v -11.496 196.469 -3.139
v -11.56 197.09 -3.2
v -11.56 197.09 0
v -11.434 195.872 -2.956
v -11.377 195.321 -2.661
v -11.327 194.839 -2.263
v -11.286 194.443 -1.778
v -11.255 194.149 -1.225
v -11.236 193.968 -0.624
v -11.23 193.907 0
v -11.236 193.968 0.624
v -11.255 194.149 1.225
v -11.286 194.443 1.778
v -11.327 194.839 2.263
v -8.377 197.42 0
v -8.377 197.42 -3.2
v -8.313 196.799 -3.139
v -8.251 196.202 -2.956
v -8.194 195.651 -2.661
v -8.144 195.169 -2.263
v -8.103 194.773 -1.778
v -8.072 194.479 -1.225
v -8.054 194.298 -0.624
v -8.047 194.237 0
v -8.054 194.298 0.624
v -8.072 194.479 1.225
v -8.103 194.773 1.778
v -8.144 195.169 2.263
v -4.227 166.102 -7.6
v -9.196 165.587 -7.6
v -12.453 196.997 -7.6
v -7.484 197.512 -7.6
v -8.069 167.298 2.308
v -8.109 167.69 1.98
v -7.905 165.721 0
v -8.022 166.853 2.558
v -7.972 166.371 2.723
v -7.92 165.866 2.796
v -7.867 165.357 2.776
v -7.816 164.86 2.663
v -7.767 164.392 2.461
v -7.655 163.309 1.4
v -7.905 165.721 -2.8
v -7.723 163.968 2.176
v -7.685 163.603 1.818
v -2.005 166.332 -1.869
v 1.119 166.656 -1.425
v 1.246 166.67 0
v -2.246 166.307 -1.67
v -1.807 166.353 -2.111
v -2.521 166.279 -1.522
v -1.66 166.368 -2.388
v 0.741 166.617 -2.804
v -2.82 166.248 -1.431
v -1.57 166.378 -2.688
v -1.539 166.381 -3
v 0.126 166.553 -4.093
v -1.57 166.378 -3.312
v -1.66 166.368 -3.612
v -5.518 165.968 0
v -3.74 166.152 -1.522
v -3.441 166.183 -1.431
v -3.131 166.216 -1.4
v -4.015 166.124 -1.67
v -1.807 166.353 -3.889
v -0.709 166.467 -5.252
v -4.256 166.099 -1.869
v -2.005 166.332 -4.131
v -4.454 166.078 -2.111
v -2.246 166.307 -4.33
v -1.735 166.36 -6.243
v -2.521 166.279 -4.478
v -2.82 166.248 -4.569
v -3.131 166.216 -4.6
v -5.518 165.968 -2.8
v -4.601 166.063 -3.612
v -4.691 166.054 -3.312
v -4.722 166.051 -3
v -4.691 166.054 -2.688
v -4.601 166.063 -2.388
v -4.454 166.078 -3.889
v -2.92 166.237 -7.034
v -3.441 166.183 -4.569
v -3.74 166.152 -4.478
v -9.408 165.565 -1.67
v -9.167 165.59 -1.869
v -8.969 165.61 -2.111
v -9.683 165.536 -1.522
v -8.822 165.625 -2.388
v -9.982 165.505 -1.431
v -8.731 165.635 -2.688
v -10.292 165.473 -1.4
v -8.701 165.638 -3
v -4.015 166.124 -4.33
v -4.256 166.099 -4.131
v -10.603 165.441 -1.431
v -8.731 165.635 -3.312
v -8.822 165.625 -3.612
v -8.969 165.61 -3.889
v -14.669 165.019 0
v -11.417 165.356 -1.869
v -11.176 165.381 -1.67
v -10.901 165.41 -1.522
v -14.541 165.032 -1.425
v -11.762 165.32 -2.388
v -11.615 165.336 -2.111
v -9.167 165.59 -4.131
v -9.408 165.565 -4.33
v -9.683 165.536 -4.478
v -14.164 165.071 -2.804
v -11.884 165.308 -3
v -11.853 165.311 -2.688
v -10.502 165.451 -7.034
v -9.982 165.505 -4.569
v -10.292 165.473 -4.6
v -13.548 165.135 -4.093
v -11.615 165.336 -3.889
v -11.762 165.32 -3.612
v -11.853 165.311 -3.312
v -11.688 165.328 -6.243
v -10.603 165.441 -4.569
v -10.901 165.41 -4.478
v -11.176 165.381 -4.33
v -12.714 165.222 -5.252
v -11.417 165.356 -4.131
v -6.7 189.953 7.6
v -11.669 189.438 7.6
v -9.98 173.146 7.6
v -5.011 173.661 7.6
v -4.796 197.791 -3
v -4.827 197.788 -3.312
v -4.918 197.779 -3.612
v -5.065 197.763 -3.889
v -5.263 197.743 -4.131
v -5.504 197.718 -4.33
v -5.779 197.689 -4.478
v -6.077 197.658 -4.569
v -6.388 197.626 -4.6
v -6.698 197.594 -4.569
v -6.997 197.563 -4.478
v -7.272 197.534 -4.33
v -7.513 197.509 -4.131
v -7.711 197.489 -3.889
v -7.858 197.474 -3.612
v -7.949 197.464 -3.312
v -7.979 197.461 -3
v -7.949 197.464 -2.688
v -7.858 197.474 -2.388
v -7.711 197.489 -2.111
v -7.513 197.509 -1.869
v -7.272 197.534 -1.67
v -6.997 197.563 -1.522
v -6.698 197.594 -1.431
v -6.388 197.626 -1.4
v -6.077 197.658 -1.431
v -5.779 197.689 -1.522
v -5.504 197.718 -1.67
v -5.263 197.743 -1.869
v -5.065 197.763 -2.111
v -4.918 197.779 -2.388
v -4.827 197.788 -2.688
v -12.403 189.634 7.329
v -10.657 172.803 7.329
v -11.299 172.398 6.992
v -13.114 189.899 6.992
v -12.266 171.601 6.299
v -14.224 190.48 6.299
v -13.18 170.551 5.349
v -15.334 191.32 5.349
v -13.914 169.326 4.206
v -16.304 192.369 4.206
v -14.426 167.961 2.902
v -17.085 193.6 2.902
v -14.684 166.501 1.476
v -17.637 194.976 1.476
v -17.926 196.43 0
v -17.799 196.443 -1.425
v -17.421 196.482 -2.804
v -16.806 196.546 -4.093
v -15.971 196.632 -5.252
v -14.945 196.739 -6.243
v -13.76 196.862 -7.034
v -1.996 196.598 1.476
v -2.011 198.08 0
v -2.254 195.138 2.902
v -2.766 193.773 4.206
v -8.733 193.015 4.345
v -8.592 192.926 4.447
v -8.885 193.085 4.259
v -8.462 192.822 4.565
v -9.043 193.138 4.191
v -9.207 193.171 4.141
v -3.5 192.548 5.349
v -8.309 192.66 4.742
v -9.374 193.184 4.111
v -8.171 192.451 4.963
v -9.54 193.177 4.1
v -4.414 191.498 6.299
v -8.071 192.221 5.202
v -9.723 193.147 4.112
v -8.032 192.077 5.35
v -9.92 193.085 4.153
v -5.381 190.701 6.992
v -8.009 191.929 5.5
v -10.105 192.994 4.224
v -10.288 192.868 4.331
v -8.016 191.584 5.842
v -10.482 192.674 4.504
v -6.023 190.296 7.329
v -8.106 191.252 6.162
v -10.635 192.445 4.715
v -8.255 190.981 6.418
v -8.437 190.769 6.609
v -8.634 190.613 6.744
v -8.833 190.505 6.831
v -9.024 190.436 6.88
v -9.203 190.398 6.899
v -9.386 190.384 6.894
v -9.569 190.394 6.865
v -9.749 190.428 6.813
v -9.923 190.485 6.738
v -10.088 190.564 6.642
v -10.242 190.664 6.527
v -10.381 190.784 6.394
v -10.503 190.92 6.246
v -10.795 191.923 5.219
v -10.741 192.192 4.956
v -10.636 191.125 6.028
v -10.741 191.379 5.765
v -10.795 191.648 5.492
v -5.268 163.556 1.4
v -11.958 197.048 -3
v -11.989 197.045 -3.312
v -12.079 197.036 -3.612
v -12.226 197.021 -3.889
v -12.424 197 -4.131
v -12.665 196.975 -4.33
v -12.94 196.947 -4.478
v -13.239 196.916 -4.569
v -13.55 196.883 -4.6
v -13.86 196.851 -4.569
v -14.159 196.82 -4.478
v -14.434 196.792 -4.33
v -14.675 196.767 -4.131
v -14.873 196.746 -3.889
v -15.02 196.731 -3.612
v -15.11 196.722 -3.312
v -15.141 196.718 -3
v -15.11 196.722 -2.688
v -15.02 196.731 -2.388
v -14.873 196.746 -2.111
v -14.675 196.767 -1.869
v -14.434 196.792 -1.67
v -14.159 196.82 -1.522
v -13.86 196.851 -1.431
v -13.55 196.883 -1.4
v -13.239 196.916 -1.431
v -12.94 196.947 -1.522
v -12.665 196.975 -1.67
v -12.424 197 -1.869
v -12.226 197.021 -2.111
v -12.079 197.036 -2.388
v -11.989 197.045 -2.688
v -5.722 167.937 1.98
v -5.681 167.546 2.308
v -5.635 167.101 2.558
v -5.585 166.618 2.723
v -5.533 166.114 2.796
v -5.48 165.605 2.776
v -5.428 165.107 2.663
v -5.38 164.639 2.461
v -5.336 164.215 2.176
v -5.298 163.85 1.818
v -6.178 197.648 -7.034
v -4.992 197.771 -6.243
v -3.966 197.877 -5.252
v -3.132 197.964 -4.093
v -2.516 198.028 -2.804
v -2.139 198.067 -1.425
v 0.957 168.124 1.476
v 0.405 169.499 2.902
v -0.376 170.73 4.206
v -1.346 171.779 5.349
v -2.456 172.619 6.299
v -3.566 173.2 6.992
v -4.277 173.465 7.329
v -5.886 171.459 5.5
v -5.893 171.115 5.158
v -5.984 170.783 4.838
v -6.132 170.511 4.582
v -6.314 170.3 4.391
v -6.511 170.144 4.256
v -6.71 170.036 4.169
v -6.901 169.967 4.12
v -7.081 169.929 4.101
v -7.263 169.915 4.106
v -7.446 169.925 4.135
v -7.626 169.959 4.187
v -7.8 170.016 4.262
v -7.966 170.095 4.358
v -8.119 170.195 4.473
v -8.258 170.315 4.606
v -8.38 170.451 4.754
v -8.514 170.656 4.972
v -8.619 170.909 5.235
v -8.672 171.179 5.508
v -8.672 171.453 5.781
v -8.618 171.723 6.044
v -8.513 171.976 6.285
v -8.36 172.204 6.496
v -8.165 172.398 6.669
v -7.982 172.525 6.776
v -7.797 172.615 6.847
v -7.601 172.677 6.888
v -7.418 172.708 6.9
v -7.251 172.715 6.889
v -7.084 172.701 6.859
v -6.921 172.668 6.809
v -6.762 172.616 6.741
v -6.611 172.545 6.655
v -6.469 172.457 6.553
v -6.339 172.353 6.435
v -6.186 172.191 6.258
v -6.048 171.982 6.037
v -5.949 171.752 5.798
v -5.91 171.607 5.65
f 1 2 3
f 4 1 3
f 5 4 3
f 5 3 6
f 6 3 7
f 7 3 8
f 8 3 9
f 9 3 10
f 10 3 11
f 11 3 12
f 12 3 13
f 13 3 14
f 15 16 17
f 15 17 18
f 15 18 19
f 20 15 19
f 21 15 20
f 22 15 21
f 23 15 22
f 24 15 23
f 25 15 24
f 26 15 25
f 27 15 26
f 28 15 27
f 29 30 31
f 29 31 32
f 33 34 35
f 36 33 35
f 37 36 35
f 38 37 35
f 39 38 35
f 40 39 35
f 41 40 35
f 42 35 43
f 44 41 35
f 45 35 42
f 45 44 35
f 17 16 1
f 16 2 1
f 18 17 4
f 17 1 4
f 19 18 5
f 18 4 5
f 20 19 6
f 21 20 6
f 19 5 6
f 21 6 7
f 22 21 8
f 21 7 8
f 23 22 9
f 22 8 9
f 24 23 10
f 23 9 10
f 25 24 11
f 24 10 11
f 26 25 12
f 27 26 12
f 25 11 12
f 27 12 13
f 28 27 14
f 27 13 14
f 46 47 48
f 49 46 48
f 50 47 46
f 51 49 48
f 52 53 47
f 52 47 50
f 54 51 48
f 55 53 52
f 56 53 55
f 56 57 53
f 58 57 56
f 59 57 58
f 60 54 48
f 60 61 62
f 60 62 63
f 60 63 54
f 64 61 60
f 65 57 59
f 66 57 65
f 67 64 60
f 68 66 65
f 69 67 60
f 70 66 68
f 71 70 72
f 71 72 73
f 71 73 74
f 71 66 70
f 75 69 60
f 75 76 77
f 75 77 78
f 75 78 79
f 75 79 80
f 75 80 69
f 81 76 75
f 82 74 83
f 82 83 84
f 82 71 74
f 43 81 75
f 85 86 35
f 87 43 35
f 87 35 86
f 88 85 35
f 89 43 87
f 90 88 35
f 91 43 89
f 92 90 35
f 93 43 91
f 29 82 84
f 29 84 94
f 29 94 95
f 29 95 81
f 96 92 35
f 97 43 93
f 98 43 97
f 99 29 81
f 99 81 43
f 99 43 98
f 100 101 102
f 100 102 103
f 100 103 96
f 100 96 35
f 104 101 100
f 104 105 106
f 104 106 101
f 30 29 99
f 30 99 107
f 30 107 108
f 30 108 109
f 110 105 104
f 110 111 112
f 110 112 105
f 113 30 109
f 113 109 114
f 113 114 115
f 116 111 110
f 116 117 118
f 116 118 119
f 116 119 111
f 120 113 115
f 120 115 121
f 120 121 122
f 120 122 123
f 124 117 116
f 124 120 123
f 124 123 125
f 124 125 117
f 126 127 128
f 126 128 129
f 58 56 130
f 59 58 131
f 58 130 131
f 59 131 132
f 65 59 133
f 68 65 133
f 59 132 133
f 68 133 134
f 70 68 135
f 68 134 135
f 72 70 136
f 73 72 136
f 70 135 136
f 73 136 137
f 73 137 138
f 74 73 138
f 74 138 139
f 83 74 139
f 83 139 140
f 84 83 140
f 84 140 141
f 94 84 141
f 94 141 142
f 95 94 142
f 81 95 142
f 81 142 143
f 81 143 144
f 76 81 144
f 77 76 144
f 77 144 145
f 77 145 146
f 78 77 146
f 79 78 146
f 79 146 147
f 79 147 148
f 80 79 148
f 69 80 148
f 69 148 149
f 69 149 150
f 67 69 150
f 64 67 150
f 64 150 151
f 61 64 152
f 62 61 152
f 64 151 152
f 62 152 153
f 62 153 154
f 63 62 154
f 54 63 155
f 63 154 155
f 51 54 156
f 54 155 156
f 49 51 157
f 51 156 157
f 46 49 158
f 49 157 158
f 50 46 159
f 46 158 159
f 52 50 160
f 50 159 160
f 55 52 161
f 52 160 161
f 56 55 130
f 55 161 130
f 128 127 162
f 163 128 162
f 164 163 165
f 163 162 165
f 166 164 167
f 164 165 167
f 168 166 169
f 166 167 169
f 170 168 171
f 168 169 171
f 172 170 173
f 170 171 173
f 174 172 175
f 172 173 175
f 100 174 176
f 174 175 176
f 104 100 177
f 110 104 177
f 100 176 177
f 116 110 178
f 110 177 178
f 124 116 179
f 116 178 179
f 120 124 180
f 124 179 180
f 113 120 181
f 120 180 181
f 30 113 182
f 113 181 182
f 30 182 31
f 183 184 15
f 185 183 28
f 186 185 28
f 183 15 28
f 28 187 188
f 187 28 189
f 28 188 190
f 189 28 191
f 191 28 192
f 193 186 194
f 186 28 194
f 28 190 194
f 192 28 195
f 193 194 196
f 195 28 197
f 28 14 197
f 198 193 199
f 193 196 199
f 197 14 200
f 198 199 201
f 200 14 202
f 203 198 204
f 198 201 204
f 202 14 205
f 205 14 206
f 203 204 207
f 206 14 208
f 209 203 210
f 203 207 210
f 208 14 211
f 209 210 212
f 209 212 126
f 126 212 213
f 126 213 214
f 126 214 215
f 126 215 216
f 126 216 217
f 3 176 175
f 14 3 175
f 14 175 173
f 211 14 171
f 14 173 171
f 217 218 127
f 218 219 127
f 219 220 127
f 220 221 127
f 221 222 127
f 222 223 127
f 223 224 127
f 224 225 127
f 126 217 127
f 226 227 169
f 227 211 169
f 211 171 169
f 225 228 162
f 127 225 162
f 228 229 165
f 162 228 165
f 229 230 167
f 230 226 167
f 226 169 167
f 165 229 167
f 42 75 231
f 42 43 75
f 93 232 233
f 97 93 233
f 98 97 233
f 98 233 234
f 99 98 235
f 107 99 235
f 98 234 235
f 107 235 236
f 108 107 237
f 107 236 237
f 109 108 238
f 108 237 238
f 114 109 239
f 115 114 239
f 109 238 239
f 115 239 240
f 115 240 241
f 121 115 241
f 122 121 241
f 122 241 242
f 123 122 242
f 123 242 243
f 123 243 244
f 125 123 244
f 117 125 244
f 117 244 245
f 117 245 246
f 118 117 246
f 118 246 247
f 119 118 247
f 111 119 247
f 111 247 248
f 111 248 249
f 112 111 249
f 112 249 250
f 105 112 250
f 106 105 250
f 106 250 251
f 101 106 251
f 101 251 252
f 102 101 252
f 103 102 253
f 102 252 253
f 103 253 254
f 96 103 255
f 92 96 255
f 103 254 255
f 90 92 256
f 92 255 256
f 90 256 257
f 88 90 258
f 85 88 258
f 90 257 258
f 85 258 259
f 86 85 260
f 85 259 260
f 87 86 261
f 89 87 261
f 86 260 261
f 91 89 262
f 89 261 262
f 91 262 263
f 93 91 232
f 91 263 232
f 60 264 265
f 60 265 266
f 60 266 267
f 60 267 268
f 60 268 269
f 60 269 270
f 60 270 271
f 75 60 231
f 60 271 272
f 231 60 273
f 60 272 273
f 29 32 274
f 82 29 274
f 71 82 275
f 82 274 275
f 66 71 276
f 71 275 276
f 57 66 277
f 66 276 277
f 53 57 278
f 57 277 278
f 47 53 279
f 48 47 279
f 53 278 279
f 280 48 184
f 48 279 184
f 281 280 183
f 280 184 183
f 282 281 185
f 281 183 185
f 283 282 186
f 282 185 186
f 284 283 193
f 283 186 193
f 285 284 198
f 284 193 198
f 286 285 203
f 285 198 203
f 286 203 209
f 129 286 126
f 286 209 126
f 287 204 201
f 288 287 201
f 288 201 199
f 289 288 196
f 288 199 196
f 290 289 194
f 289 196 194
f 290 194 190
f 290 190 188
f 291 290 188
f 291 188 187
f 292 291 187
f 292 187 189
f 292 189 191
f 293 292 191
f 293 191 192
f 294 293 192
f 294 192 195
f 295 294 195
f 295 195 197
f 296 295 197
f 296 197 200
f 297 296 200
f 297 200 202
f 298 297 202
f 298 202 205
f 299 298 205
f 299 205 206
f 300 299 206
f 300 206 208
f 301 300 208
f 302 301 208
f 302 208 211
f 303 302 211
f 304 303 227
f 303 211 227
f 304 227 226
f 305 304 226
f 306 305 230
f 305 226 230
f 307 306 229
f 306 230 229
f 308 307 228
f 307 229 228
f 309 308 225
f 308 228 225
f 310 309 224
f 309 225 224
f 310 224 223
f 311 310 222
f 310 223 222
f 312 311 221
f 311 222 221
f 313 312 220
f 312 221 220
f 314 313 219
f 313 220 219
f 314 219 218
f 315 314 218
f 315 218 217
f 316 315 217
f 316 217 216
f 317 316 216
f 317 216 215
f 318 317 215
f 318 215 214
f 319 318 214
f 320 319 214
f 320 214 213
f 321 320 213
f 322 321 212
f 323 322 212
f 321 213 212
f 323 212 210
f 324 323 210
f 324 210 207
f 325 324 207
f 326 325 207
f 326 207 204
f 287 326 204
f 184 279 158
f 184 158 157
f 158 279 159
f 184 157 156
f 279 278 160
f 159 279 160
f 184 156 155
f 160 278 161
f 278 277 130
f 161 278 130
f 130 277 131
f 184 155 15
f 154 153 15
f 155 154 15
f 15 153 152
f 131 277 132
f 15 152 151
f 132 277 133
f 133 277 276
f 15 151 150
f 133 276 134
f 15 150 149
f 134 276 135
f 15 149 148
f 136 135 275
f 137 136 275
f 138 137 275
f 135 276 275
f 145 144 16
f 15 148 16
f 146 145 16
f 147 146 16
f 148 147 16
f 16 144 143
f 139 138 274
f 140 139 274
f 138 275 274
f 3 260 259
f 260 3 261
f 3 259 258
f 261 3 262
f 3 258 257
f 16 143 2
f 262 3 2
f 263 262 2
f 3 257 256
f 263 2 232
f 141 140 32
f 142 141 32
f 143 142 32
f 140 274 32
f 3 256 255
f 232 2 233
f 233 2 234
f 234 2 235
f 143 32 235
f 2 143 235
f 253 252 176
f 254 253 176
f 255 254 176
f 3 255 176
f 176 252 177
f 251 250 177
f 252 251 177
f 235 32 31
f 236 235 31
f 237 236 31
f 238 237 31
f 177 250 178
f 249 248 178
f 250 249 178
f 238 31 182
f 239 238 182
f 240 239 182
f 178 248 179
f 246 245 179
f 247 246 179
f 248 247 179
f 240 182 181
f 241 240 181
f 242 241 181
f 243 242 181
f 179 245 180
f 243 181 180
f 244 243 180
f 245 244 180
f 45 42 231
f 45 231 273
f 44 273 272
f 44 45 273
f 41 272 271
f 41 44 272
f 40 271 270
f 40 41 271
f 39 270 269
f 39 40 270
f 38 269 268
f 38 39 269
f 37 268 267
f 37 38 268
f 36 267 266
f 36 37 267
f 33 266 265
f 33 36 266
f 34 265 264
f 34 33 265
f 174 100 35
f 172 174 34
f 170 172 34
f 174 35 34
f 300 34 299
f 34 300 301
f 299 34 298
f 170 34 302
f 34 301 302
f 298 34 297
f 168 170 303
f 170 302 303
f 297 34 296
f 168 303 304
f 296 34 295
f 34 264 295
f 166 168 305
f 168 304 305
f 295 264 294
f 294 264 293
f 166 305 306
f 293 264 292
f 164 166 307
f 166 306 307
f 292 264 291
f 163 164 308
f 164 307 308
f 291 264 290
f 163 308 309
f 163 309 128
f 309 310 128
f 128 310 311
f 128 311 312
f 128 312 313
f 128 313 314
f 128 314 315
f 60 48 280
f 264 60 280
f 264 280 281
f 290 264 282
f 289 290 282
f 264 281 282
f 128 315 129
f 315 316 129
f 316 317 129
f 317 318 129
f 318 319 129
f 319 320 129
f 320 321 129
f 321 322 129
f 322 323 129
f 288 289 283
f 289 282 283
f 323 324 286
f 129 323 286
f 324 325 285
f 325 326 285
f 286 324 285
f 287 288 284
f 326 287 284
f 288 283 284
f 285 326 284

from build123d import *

# Parameters (mm, degrees)
SKETCH3_R               = 8
BOSS_EXTRUDE1_DEPTH     = 31.578947368
CUT_EXTRUDE1_DEPTH      = 12.240009257
CUT_EXTRUDE1_DEPTH_BACK = 12.240009257
BOSS_EXTRUDE2_DEPTH     = 1.2
CUT_EXTRUDE2_DEPTH      = 1.6
SKETCH8_R               = 1.4
SKETCH8_R_2             = 1.6
CUT_EXTRUDE3_DEPTH      = 2.64160469
CUT_EXTRUDE3_DEPTH_BACK = 35.921940493
CUT_EXTRUDE4_DEPTH      = 35.921940493


with BuildPart() as part:
    # Sketch3 → Boss-Extrude1 (new body)
    with BuildSketch(Plane(origin=(-20.344467381, 196.178792599, 0), x_dir=(-0.994665758, -0.103150523, 0), z_dir=(0.103150523, -0.994665758, 0))):
        with Locations((-10.431405186, 0)):
            Circle(SKETCH3_R)
    extrude(amount=BOSS_EXTRUDE1_DEPTH)

    # Sketch4 → Cut-Extrude1 (cut, two sides)
    with BuildSketch(Plane(origin=(10.375761543, 1.076004901, 0), x_dir=(0.103150523, -0.994665758, 0), z_dir=(-0.994665758, -0.103150523, 0))) as cut_extrude1_sk:
        Polygon((-197.230869842, 0), (-189.230869842, 8), (-197.230869842, 8), align=None)
        Polygon((-173.651922474, 8), (-165.651922474, 8), (-165.651922474, 0), align=None)
    extrude(amount=CUT_EXTRUDE1_DEPTH, mode=Mode.SUBTRACT)
    extrude(cut_extrude1_sk.sketch, amount=-CUT_EXTRUDE1_DEPTH_BACK, mode=Mode.SUBTRACT)

    # Sketch5 → Boss-Extrude2 (add, symmetric)
    with BuildSketch(Plane(origin=(10.375761543, 1.076004901, 0), x_dir=(0.103150523, -0.994665758, 0), z_dir=(-0.994665758, -0.103150523, 0))):
        with BuildLine():
            Line((-165.651922474, -2.8), (-163.227051343, 1.4))
            ThreePointArc((-163.227051343, 1.4), (-165.286449135, 2.776045612), (-167.631821461, 1.979898987))
            Line((-167.631821461, 1.979898987), (-165.651922474, 0))
            Line((-165.651922474, 0), (-165.651922474, -2.8))
        make_face()
    extrude(amount=BOSS_EXTRUDE2_DEPTH, both=True)

    # Sketch7 → Cut-Extrude2 (cut, symmetric)
    with BuildSketch(Plane(origin=(10.375761543, 1.076004901, 0), x_dir=(0.103150523, -0.994665758, 0), z_dir=(-0.994665758, -0.103150523, 0))):
        with BuildLine():
            Line((-194.968128142, 2.2627417), (-197.230869842, 0))
            Line((-197.230869842, 0), (-197.230869842, -3.2))
            ThreePointArc((-197.230869842, -3.2), (-194.274455338, -1.224586984), (-194.968128142, 2.2627417))
        make_face()
    extrude(amount=CUT_EXTRUDE2_DEPTH, both=True, mode=Mode.SUBTRACT)

    # Sketch8 → Cut-Extrude3 (cut, two sides)
    with BuildSketch(Plane(origin=(-20.344467381, 196.178792599, 0), x_dir=(0.994665758, 0.103150523, 0), z_dir=(-0.103150523, 0.994665758, 0))) as cut_extrude3_sk:
        with Locations((10.431405186, -5.5)):
            Circle(SKETCH8_R)
        with Locations((6.831405186, 3)):
            Circle(SKETCH8_R_2)
        with Locations((14.031405186, 3)):
            Circle(SKETCH8_R_2)
    extrude(amount=CUT_EXTRUDE3_DEPTH, mode=Mode.SUBTRACT)
    extrude(cut_extrude3_sk.sketch, amount=-CUT_EXTRUDE3_DEPTH_BACK, mode=Mode.SUBTRACT)

    # Sketch9 → Cut-Extrude4 (cut, through all)
    with BuildSketch(Plane(origin=(-20.344467381, 196.178792599, 0), x_dir=(0.994665758, 0.103150523, 0), z_dir=(-0.103150523, 0.994665758, 0))):
        with BuildLine():
            Line((7.933405986, 7.6), (12.929404385, 7.6))
            ThreePointArc((12.929404385, 7.6), (10.431405186, 8), (7.933405986, 7.6))
        make_face()
        with BuildLine():
            Line((7.933405986, -7.6), (12.929404385, -7.6))
            ThreePointArc((12.929404385, -7.6), (10.431405186, -8), (7.933405986, -7.6))
        make_face()
    extrude(amount=-CUT_EXTRUDE4_DEPTH, mode=Mode.SUBTRACT)


solid = part.part
